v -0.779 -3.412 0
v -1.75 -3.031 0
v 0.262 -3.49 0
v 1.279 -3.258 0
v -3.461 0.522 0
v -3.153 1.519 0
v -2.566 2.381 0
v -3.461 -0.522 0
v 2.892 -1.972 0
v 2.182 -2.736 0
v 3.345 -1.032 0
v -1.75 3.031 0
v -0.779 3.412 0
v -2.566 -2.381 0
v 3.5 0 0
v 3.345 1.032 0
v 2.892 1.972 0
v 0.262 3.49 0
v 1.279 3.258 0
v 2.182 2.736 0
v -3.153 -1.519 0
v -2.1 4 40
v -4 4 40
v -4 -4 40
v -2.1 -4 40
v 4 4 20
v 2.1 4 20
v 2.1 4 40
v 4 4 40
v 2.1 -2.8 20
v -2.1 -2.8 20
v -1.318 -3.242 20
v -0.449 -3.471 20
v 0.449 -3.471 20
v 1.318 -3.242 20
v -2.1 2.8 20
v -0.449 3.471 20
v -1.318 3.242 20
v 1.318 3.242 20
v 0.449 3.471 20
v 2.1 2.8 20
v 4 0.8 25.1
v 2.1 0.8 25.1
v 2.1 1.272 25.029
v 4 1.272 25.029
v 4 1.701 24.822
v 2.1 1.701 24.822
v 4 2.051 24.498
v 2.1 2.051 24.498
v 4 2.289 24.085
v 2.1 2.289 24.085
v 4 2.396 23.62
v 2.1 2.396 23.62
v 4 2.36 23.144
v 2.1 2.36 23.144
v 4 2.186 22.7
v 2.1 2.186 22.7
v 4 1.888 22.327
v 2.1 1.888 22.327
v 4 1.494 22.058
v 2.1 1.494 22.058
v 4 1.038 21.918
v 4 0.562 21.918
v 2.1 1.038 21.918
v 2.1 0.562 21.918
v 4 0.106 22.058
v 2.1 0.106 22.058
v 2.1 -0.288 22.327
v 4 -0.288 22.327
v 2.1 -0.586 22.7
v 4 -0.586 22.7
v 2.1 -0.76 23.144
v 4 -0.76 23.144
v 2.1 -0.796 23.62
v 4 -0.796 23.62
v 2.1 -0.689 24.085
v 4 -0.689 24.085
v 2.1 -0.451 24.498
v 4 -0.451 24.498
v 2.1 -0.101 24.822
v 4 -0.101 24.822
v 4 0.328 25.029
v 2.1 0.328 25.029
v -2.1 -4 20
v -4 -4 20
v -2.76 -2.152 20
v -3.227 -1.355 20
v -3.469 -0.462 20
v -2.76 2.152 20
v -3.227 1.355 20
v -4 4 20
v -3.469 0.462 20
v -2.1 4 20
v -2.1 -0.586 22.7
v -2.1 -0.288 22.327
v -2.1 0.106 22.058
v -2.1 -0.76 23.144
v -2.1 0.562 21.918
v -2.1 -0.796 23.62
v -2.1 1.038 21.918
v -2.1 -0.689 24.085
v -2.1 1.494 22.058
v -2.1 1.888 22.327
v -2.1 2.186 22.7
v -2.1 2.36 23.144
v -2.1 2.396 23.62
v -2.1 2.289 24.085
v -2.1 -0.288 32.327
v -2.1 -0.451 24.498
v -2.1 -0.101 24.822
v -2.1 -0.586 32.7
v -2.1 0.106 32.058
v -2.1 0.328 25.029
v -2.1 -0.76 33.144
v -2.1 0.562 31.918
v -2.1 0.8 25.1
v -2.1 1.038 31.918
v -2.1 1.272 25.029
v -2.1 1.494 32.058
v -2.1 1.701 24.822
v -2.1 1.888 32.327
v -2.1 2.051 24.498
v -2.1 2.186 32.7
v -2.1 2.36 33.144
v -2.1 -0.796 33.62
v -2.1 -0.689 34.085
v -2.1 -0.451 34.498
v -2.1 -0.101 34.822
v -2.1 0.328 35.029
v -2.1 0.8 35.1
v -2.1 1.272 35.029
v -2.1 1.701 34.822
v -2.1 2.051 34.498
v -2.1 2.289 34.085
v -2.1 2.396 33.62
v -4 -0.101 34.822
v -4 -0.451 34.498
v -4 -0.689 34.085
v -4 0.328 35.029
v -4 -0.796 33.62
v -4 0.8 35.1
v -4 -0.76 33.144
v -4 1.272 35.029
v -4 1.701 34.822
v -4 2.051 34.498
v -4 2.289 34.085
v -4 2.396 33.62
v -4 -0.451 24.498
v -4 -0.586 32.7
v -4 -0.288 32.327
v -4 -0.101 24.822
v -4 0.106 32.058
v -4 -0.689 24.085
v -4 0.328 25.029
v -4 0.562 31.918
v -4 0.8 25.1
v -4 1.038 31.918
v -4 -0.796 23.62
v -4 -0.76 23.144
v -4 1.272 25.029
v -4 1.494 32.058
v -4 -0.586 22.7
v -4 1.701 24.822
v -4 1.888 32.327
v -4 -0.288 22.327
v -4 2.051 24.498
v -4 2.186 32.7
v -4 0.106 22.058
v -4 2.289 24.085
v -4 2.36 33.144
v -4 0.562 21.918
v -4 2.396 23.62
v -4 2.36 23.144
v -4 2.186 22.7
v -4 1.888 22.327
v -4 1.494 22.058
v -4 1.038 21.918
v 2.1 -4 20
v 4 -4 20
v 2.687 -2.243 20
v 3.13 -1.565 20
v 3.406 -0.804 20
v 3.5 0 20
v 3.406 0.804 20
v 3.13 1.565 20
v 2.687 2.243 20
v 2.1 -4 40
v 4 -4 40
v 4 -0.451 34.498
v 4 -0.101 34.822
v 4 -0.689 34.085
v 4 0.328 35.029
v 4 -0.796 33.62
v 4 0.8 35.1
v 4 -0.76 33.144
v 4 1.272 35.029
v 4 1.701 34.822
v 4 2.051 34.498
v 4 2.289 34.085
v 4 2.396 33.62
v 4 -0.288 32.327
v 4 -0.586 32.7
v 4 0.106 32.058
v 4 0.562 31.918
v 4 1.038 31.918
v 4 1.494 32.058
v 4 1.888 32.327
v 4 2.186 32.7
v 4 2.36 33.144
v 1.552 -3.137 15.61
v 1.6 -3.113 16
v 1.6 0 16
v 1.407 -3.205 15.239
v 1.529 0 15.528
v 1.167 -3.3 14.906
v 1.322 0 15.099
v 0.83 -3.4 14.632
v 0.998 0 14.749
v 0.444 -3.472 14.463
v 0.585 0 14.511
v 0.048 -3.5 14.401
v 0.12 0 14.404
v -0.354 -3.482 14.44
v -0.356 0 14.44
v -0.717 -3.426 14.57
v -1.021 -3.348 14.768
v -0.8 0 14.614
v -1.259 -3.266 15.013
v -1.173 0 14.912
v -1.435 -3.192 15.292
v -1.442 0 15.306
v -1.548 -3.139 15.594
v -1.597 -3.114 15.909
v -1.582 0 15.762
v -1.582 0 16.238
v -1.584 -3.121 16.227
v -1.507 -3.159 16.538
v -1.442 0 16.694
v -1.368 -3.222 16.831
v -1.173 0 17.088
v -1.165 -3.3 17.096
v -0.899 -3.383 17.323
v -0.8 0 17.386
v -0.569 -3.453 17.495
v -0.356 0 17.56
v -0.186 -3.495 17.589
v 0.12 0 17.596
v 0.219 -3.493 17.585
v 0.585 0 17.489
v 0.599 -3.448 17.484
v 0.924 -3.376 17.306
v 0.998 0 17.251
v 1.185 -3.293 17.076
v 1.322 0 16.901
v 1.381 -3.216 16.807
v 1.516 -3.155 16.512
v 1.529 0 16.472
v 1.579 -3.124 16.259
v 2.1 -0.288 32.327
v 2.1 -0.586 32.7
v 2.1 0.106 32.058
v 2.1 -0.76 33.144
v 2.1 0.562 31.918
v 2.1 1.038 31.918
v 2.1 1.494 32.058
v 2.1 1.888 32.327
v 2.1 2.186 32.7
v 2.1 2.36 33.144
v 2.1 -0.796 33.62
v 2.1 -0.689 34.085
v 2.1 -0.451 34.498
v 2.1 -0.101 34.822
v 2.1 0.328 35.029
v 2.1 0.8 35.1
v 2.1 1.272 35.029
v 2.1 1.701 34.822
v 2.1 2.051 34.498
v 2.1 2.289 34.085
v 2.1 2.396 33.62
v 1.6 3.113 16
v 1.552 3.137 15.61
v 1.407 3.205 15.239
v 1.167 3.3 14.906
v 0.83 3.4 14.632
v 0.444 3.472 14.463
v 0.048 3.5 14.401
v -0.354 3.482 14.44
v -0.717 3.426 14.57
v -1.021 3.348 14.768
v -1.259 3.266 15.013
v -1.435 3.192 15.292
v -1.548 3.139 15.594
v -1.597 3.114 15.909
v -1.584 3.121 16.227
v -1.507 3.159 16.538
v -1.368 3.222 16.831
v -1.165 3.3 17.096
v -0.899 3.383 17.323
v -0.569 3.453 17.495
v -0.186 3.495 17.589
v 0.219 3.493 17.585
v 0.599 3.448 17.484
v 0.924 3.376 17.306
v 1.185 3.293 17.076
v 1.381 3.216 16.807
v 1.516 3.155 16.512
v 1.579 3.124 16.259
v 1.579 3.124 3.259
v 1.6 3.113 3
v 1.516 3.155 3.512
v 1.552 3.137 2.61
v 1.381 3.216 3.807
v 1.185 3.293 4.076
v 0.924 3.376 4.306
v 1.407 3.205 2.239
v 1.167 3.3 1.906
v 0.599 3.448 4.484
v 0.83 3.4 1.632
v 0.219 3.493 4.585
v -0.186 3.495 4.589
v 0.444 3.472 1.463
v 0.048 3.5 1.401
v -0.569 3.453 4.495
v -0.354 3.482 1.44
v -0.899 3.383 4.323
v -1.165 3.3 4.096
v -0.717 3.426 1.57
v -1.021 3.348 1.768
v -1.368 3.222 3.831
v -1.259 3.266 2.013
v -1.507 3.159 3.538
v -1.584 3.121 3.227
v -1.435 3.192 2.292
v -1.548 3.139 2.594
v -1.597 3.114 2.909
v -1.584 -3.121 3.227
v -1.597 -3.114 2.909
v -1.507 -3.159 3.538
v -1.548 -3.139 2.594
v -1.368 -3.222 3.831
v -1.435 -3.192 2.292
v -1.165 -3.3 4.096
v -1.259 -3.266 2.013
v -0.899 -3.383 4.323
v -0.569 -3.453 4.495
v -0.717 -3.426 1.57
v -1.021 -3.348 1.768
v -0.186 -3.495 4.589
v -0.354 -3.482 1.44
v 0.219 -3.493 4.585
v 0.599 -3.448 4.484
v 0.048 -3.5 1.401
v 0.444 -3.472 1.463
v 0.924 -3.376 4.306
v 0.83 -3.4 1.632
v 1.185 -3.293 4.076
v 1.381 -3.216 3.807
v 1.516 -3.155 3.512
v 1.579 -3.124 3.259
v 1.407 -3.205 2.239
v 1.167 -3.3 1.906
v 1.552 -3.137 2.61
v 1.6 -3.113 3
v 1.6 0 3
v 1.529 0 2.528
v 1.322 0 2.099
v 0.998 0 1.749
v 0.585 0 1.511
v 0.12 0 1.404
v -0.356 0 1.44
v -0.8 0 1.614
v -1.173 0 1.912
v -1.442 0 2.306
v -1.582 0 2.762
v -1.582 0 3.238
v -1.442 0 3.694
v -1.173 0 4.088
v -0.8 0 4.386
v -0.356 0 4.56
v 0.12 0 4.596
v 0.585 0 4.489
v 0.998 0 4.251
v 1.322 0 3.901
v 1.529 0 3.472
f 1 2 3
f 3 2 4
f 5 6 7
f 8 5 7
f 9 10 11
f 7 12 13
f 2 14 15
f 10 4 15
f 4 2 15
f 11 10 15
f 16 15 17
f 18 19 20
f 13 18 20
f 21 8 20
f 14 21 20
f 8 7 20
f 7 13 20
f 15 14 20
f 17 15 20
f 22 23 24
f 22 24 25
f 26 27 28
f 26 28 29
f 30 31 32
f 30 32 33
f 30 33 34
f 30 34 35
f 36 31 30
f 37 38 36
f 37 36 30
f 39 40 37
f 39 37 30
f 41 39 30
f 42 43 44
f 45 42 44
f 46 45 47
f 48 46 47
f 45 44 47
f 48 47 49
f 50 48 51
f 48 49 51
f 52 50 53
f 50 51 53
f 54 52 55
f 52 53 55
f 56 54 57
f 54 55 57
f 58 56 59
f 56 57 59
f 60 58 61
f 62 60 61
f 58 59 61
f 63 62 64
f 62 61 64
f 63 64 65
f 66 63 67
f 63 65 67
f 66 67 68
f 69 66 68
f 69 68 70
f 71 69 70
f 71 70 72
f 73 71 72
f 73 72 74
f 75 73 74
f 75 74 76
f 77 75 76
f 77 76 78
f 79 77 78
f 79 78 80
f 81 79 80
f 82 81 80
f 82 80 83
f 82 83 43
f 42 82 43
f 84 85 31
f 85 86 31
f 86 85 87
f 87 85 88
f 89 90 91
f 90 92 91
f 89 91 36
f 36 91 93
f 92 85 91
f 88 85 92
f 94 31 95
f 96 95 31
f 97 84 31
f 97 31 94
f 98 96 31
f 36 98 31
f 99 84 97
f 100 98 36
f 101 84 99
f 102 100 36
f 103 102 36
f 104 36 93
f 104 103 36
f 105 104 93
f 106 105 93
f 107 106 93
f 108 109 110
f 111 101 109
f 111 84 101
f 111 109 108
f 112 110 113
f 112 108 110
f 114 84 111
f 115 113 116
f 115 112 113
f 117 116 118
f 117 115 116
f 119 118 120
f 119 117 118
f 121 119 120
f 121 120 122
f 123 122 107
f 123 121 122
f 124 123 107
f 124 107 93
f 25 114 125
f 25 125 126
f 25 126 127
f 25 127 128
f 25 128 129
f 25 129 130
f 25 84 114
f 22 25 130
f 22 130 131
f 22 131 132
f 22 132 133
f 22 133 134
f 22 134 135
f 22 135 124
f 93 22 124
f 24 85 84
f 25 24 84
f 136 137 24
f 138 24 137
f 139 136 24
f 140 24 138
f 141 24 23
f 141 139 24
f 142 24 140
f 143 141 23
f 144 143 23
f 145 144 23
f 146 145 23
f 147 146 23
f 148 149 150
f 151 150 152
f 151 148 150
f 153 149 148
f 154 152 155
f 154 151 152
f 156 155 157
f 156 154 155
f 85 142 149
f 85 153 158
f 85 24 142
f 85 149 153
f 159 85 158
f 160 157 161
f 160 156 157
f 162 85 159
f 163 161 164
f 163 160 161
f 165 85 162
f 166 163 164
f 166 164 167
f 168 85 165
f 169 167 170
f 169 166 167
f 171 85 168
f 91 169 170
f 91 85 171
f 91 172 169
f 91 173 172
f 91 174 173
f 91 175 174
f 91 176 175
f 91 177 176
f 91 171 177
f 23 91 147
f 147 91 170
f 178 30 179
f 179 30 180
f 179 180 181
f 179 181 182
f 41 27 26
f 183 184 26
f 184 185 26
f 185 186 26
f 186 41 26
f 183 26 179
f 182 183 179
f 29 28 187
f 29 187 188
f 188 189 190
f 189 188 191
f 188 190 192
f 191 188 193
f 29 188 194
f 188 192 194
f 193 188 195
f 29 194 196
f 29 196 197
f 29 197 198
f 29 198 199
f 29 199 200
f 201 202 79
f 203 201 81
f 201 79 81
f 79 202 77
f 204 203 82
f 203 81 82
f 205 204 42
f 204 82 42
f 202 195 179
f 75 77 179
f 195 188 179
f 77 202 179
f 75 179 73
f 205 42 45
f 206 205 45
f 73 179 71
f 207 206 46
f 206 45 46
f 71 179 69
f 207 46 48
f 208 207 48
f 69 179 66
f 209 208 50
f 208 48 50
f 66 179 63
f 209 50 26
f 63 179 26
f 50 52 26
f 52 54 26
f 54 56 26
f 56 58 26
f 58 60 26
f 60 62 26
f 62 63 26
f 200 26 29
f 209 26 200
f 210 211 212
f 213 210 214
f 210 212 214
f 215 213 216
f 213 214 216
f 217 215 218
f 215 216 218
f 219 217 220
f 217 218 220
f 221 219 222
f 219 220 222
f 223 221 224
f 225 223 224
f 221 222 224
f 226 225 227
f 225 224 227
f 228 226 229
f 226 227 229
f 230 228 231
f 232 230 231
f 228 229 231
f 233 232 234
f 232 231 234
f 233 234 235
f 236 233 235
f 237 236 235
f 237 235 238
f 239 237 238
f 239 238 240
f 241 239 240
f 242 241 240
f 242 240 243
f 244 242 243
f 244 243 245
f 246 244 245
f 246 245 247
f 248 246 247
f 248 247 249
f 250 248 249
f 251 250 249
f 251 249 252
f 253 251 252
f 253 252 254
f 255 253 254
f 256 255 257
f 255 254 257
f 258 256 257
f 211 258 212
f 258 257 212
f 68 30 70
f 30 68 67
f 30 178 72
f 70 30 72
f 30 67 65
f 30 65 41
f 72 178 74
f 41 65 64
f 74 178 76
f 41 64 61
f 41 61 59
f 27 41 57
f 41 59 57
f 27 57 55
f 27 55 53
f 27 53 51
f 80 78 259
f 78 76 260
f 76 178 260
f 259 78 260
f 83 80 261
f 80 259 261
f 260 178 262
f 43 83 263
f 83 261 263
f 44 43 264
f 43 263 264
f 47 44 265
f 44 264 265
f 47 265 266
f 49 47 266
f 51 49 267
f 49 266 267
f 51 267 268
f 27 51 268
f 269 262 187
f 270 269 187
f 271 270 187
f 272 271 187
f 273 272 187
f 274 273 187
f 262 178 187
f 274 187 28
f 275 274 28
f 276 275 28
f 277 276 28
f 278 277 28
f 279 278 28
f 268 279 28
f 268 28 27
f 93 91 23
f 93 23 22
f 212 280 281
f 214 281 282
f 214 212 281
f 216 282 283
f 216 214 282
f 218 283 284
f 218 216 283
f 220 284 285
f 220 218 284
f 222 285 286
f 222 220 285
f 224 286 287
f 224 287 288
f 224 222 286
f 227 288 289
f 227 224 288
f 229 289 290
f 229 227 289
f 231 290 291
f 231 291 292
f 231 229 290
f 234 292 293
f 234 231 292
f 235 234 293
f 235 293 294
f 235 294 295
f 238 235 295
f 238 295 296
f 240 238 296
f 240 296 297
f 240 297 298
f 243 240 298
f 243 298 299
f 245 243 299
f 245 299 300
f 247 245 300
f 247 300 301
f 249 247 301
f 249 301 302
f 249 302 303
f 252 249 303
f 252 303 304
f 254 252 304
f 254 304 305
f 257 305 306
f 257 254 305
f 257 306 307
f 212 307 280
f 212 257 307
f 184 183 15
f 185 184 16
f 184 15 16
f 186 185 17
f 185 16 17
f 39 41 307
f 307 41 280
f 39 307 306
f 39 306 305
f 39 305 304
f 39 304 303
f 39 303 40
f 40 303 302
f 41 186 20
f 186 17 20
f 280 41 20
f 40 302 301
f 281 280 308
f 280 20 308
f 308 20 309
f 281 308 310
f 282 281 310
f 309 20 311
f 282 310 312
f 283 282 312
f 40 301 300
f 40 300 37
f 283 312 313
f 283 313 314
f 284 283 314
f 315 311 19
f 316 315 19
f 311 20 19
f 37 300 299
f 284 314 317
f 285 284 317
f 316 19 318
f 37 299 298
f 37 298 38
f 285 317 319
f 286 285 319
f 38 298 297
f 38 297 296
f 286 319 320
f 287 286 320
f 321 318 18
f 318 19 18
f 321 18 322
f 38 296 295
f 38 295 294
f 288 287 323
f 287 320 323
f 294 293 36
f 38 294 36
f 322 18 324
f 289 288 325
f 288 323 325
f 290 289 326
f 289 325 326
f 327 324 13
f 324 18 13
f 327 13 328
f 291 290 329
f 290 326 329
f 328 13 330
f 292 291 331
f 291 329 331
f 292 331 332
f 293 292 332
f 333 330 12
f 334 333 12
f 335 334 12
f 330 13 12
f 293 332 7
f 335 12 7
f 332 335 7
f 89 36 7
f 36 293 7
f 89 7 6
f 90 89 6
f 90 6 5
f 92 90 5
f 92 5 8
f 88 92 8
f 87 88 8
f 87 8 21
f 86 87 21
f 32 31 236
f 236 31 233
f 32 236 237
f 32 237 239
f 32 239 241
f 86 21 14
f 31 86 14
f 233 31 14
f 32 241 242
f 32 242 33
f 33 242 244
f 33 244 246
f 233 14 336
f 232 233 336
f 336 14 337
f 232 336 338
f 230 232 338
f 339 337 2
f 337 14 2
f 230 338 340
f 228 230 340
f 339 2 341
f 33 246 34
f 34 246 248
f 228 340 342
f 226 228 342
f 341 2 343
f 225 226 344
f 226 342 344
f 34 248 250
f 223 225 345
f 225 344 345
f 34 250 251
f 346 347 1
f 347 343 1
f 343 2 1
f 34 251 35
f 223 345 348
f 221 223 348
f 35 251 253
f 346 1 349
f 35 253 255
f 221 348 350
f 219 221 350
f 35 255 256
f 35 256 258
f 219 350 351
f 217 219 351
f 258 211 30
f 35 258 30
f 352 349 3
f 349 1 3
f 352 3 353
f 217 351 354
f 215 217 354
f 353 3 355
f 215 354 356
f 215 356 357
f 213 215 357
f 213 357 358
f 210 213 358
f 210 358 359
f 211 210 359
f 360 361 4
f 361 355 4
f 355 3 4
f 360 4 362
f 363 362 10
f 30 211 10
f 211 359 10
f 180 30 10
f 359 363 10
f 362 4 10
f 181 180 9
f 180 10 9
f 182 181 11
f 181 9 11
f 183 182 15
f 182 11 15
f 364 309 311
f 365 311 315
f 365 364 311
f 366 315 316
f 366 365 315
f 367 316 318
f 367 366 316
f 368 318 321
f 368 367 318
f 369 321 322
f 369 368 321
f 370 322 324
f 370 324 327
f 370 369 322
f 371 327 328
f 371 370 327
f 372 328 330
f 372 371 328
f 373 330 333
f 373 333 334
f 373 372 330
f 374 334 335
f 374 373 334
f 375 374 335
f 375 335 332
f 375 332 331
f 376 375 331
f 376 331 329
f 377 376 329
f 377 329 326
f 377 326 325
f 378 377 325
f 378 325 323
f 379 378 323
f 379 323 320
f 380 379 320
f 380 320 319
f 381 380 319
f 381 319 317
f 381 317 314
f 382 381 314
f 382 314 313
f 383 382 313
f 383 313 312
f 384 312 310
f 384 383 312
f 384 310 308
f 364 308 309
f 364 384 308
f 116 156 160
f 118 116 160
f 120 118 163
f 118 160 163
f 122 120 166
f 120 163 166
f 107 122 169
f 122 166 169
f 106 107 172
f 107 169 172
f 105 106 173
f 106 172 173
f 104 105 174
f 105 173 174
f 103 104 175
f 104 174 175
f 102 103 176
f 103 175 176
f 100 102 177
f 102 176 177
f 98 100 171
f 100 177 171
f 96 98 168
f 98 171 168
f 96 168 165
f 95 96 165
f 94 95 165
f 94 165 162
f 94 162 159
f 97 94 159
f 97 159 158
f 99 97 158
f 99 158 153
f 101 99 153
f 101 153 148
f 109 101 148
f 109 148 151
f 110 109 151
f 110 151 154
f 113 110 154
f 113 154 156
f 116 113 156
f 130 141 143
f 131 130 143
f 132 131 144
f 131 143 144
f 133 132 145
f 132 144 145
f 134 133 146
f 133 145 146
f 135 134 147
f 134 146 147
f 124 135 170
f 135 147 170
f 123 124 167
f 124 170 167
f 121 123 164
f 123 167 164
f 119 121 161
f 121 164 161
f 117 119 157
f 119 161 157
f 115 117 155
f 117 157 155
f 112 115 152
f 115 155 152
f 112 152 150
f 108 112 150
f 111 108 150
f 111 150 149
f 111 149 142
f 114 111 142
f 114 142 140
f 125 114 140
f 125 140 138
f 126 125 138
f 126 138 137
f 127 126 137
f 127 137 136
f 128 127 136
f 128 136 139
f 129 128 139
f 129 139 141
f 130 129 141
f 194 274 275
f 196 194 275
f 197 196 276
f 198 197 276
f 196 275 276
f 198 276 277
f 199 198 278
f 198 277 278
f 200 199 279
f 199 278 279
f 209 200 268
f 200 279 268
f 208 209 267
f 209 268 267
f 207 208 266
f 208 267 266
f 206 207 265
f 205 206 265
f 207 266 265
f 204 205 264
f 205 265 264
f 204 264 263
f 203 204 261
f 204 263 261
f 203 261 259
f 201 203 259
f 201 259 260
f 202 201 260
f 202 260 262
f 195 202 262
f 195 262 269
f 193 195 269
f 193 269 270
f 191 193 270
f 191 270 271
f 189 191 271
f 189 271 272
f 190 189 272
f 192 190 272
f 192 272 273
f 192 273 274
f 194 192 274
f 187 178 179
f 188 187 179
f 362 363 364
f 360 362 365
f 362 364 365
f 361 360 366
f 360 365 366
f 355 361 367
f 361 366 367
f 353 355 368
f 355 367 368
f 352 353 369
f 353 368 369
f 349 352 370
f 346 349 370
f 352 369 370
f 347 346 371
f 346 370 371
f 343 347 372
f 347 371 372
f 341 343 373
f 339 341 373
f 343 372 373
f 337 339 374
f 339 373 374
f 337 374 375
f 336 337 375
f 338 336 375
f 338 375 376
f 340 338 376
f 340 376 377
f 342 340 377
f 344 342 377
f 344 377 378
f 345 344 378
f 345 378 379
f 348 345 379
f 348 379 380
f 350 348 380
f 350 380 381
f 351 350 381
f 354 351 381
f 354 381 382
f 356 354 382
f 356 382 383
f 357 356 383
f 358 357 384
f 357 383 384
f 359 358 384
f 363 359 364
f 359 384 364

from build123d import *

# Parameters (mm, degrees)
SKETCH1_R               = 3.5
BOSS_EXTRUDE1_DEPTH     = 20
SKETCH2_R               = 1.6
CUT_EXTRUDE1_DEPTH      = 4.5
CUT_EXTRUDE1_DEPTH_BACK = 4.5
SKETCH3_W               = 8
SKETCH3_H               = 8
BOSS_EXTRUDE2_DEPTH     = 20
SKETCH4_W               = 4.2
SKETCH4_H               = 8
CUT_EXTRUDE2_DEPTH      = 20
SKETCH5_R               = 1.6
CUT_EXTRUDE3_DEPTH      = 9


with BuildPart() as part:
    # Sketch1 → Boss-Extrude1 (new body)
    with BuildSketch(Plane.XY):
        Circle(SKETCH1_R)
    extrude(amount=BOSS_EXTRUDE1_DEPTH)

    # Sketch2 → Cut-Extrude1 (cut, two sides)
    with BuildSketch(Plane(origin=(0, 0, 0), x_dir=(1, 0, 0), z_dir=(0, 1, 0))) as cut_extrude1_sk:
        with Locations((0, -3)):
            Circle(SKETCH2_R)
        with Locations((0, -16)):
            Circle(SKETCH2_R)
    extrude(amount=CUT_EXTRUDE1_DEPTH, mode=Mode.SUBTRACT)
    extrude(cut_extrude1_sk.sketch, amount=-CUT_EXTRUDE1_DEPTH_BACK, mode=Mode.SUBTRACT)

    # Sketch3 → Boss-Extrude2 (add)
    with BuildSketch(Plane.XY.offset(20)):
        Rectangle(SKETCH3_W, SKETCH3_H)
    extrude(amount=BOSS_EXTRUDE2_DEPTH)

    # Sketch4 → Cut-Extrude2 (cut)
    with BuildSketch(Plane.XY.offset(40)):
        Rectangle(SKETCH4_W, SKETCH4_H)
    extrude(amount=-CUT_EXTRUDE2_DEPTH, mode=Mode.SUBTRACT)

    # Sketch5 → Cut-Extrude3 (cut, through all)
    with BuildSketch(Plane.ZY.offset(4)):
        with Locations((33.5, 0.8)):
            Circle(SKETCH5_R)
        with Locations((23.5, 0.8)):
            Circle(SKETCH5_R)
    extrude(amount=-CUT_EXTRUDE3_DEPTH, mode=Mode.SUBTRACT)


solid = part.part
